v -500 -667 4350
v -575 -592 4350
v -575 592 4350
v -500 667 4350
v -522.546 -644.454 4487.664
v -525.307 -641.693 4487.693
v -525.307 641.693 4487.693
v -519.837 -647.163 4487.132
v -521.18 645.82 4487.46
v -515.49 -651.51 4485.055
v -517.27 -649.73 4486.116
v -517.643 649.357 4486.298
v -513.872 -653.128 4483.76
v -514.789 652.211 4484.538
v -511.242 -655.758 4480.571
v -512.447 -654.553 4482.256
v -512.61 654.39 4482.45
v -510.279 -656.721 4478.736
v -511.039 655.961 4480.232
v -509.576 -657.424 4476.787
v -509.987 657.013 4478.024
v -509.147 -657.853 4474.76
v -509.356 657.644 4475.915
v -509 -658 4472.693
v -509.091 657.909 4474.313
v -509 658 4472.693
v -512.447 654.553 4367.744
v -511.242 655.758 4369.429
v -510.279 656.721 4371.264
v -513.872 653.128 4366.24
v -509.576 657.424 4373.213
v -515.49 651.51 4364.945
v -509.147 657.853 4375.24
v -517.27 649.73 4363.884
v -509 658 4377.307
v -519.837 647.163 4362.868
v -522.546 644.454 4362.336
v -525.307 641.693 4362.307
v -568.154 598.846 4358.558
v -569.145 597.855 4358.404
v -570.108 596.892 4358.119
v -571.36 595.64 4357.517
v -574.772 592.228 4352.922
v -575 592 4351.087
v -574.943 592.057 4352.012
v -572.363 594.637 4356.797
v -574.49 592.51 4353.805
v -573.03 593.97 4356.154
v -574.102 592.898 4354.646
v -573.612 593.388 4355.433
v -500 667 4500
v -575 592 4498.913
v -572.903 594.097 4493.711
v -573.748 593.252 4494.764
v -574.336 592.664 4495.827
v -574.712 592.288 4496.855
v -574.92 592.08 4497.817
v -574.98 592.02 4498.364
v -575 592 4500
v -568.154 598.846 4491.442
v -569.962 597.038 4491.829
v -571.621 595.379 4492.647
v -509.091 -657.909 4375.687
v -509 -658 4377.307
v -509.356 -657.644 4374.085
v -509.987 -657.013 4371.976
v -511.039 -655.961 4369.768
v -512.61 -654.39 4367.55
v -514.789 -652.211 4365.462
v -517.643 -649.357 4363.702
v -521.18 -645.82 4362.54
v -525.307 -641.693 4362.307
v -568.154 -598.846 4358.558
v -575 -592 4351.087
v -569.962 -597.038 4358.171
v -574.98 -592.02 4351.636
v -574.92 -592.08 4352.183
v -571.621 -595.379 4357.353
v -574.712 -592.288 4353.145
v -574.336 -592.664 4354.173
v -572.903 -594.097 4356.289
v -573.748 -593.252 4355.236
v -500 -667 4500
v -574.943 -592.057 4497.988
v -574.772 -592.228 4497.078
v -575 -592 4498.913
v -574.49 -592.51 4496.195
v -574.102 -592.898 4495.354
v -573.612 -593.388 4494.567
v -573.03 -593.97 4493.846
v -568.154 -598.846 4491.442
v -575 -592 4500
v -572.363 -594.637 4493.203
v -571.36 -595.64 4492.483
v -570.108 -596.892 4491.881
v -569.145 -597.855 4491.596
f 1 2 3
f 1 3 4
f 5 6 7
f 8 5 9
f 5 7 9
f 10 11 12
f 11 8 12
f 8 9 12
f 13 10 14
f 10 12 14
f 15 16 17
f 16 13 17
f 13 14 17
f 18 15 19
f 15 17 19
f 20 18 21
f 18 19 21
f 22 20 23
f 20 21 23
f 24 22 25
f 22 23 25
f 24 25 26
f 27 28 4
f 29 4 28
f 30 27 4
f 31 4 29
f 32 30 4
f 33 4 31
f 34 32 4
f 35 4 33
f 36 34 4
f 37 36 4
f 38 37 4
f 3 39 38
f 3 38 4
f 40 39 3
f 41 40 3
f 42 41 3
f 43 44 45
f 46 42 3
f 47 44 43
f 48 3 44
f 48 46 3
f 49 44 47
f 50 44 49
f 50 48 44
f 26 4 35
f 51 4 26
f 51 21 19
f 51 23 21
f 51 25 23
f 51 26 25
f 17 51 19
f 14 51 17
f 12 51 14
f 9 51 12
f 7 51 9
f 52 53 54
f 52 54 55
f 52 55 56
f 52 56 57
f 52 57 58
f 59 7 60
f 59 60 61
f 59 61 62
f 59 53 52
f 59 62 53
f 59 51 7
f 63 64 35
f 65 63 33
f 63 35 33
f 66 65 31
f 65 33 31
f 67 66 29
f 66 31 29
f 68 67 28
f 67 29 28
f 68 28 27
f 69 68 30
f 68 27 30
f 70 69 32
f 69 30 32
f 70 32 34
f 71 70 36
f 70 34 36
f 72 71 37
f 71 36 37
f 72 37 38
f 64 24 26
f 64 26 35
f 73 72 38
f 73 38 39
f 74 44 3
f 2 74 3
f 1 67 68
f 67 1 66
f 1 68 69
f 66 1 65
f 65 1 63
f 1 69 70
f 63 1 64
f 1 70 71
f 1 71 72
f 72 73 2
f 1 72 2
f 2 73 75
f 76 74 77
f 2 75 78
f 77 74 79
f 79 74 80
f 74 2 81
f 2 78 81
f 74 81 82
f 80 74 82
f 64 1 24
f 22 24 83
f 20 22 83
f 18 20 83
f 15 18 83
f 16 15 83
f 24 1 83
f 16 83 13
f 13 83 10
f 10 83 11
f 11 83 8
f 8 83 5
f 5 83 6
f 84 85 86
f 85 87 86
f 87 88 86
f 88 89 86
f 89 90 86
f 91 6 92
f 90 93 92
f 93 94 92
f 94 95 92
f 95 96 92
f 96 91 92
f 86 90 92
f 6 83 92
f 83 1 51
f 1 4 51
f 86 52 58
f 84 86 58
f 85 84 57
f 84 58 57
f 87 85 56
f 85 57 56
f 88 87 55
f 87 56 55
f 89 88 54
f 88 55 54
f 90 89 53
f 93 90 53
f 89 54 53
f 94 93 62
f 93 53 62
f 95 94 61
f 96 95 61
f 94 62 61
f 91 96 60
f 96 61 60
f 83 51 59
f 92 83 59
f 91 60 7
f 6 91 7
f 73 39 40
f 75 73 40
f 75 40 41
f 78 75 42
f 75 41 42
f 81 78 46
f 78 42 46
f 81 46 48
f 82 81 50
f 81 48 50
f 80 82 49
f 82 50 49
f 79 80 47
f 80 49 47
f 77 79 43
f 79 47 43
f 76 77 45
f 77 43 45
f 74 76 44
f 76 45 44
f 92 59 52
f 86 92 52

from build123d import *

# Parameters (mm, degrees)
EXTRUDE009_DEPTH = 150
EXTRUDE008_DEPTH = 667


with BuildPart() as extrude009:
    # Sketch010 (on Face2 of Extrude008) → Extrude009 (new body)
    with BuildSketch(Plane.XY.offset(4500)):
        Polygon((500, 667), (575, 592), (575, 667), align=None)
    extrude(amount=-EXTRUDE009_DEPTH)


with BuildPart() as compound008:
    # Mirror008: instance of Extrude009
    add(extrude009.part.mirror(Plane(origin=(300, 0, 0), x_dir=(1, 0, 0), z_dir=(0, 1, 0))))

    # Compound008: union Extrude009
    add(extrude009.part)


with BuildPart() as cut002:
    # ChannelSteel002 → Extrude008 (new body, symmetric)
    with BuildSketch(Plane(origin=(521.664812, 0, 4425), x_dir=(1, 0, 0), z_dir=(0, 1, 0))):
        with BuildLine():
            Line((-21.664812, 75), (-21.664812, -75))
            Line((-21.664812, -75), (53.335188, -75))
            Line((53.335188, -75), (53.335188, -73.913145))
            ThreePointArc((53.335188, -73.913145), (51.364768, -68.846219), (46.488856, -66.441685))
            Line((46.488856, -66.441685), (3.642524, -62.693117))
            ThreePointArc((3.642524, -62.693117), (-7.792334, -58.760281), (-12.664812, -47.693117))
            Line((-12.664812, -47.693117), (-12.664812, 47.693117))
            ThreePointArc((-12.664812, 47.693117), (-7.792334, 58.760281), (3.642524, 62.693117))
            Line((3.642524, 62.693117), (46.488856, 66.441685))
            ThreePointArc((46.488856, 66.441685), (51.364768, 68.846219), (53.335188, 73.913145))
            Line((53.335188, 73.913145), (53.335188, 75))
            Line((53.335188, 75), (-21.664812, 75))
        make_face()
    extrude(amount=EXTRUDE008_DEPTH, both=True)

    # Cut002: cut Compound008
    add(compound008.part, mode=Mode.SUBTRACT)


with BuildPart() as cut002_mirrored:
    # Mirror009: instance of Cut002
    add(cut002.part.mirror(Plane(origin=(0, -600, 0), x_dir=(0, -1, 0), z_dir=(1, 0, 0))))


solid = cut002_mirrored.part
